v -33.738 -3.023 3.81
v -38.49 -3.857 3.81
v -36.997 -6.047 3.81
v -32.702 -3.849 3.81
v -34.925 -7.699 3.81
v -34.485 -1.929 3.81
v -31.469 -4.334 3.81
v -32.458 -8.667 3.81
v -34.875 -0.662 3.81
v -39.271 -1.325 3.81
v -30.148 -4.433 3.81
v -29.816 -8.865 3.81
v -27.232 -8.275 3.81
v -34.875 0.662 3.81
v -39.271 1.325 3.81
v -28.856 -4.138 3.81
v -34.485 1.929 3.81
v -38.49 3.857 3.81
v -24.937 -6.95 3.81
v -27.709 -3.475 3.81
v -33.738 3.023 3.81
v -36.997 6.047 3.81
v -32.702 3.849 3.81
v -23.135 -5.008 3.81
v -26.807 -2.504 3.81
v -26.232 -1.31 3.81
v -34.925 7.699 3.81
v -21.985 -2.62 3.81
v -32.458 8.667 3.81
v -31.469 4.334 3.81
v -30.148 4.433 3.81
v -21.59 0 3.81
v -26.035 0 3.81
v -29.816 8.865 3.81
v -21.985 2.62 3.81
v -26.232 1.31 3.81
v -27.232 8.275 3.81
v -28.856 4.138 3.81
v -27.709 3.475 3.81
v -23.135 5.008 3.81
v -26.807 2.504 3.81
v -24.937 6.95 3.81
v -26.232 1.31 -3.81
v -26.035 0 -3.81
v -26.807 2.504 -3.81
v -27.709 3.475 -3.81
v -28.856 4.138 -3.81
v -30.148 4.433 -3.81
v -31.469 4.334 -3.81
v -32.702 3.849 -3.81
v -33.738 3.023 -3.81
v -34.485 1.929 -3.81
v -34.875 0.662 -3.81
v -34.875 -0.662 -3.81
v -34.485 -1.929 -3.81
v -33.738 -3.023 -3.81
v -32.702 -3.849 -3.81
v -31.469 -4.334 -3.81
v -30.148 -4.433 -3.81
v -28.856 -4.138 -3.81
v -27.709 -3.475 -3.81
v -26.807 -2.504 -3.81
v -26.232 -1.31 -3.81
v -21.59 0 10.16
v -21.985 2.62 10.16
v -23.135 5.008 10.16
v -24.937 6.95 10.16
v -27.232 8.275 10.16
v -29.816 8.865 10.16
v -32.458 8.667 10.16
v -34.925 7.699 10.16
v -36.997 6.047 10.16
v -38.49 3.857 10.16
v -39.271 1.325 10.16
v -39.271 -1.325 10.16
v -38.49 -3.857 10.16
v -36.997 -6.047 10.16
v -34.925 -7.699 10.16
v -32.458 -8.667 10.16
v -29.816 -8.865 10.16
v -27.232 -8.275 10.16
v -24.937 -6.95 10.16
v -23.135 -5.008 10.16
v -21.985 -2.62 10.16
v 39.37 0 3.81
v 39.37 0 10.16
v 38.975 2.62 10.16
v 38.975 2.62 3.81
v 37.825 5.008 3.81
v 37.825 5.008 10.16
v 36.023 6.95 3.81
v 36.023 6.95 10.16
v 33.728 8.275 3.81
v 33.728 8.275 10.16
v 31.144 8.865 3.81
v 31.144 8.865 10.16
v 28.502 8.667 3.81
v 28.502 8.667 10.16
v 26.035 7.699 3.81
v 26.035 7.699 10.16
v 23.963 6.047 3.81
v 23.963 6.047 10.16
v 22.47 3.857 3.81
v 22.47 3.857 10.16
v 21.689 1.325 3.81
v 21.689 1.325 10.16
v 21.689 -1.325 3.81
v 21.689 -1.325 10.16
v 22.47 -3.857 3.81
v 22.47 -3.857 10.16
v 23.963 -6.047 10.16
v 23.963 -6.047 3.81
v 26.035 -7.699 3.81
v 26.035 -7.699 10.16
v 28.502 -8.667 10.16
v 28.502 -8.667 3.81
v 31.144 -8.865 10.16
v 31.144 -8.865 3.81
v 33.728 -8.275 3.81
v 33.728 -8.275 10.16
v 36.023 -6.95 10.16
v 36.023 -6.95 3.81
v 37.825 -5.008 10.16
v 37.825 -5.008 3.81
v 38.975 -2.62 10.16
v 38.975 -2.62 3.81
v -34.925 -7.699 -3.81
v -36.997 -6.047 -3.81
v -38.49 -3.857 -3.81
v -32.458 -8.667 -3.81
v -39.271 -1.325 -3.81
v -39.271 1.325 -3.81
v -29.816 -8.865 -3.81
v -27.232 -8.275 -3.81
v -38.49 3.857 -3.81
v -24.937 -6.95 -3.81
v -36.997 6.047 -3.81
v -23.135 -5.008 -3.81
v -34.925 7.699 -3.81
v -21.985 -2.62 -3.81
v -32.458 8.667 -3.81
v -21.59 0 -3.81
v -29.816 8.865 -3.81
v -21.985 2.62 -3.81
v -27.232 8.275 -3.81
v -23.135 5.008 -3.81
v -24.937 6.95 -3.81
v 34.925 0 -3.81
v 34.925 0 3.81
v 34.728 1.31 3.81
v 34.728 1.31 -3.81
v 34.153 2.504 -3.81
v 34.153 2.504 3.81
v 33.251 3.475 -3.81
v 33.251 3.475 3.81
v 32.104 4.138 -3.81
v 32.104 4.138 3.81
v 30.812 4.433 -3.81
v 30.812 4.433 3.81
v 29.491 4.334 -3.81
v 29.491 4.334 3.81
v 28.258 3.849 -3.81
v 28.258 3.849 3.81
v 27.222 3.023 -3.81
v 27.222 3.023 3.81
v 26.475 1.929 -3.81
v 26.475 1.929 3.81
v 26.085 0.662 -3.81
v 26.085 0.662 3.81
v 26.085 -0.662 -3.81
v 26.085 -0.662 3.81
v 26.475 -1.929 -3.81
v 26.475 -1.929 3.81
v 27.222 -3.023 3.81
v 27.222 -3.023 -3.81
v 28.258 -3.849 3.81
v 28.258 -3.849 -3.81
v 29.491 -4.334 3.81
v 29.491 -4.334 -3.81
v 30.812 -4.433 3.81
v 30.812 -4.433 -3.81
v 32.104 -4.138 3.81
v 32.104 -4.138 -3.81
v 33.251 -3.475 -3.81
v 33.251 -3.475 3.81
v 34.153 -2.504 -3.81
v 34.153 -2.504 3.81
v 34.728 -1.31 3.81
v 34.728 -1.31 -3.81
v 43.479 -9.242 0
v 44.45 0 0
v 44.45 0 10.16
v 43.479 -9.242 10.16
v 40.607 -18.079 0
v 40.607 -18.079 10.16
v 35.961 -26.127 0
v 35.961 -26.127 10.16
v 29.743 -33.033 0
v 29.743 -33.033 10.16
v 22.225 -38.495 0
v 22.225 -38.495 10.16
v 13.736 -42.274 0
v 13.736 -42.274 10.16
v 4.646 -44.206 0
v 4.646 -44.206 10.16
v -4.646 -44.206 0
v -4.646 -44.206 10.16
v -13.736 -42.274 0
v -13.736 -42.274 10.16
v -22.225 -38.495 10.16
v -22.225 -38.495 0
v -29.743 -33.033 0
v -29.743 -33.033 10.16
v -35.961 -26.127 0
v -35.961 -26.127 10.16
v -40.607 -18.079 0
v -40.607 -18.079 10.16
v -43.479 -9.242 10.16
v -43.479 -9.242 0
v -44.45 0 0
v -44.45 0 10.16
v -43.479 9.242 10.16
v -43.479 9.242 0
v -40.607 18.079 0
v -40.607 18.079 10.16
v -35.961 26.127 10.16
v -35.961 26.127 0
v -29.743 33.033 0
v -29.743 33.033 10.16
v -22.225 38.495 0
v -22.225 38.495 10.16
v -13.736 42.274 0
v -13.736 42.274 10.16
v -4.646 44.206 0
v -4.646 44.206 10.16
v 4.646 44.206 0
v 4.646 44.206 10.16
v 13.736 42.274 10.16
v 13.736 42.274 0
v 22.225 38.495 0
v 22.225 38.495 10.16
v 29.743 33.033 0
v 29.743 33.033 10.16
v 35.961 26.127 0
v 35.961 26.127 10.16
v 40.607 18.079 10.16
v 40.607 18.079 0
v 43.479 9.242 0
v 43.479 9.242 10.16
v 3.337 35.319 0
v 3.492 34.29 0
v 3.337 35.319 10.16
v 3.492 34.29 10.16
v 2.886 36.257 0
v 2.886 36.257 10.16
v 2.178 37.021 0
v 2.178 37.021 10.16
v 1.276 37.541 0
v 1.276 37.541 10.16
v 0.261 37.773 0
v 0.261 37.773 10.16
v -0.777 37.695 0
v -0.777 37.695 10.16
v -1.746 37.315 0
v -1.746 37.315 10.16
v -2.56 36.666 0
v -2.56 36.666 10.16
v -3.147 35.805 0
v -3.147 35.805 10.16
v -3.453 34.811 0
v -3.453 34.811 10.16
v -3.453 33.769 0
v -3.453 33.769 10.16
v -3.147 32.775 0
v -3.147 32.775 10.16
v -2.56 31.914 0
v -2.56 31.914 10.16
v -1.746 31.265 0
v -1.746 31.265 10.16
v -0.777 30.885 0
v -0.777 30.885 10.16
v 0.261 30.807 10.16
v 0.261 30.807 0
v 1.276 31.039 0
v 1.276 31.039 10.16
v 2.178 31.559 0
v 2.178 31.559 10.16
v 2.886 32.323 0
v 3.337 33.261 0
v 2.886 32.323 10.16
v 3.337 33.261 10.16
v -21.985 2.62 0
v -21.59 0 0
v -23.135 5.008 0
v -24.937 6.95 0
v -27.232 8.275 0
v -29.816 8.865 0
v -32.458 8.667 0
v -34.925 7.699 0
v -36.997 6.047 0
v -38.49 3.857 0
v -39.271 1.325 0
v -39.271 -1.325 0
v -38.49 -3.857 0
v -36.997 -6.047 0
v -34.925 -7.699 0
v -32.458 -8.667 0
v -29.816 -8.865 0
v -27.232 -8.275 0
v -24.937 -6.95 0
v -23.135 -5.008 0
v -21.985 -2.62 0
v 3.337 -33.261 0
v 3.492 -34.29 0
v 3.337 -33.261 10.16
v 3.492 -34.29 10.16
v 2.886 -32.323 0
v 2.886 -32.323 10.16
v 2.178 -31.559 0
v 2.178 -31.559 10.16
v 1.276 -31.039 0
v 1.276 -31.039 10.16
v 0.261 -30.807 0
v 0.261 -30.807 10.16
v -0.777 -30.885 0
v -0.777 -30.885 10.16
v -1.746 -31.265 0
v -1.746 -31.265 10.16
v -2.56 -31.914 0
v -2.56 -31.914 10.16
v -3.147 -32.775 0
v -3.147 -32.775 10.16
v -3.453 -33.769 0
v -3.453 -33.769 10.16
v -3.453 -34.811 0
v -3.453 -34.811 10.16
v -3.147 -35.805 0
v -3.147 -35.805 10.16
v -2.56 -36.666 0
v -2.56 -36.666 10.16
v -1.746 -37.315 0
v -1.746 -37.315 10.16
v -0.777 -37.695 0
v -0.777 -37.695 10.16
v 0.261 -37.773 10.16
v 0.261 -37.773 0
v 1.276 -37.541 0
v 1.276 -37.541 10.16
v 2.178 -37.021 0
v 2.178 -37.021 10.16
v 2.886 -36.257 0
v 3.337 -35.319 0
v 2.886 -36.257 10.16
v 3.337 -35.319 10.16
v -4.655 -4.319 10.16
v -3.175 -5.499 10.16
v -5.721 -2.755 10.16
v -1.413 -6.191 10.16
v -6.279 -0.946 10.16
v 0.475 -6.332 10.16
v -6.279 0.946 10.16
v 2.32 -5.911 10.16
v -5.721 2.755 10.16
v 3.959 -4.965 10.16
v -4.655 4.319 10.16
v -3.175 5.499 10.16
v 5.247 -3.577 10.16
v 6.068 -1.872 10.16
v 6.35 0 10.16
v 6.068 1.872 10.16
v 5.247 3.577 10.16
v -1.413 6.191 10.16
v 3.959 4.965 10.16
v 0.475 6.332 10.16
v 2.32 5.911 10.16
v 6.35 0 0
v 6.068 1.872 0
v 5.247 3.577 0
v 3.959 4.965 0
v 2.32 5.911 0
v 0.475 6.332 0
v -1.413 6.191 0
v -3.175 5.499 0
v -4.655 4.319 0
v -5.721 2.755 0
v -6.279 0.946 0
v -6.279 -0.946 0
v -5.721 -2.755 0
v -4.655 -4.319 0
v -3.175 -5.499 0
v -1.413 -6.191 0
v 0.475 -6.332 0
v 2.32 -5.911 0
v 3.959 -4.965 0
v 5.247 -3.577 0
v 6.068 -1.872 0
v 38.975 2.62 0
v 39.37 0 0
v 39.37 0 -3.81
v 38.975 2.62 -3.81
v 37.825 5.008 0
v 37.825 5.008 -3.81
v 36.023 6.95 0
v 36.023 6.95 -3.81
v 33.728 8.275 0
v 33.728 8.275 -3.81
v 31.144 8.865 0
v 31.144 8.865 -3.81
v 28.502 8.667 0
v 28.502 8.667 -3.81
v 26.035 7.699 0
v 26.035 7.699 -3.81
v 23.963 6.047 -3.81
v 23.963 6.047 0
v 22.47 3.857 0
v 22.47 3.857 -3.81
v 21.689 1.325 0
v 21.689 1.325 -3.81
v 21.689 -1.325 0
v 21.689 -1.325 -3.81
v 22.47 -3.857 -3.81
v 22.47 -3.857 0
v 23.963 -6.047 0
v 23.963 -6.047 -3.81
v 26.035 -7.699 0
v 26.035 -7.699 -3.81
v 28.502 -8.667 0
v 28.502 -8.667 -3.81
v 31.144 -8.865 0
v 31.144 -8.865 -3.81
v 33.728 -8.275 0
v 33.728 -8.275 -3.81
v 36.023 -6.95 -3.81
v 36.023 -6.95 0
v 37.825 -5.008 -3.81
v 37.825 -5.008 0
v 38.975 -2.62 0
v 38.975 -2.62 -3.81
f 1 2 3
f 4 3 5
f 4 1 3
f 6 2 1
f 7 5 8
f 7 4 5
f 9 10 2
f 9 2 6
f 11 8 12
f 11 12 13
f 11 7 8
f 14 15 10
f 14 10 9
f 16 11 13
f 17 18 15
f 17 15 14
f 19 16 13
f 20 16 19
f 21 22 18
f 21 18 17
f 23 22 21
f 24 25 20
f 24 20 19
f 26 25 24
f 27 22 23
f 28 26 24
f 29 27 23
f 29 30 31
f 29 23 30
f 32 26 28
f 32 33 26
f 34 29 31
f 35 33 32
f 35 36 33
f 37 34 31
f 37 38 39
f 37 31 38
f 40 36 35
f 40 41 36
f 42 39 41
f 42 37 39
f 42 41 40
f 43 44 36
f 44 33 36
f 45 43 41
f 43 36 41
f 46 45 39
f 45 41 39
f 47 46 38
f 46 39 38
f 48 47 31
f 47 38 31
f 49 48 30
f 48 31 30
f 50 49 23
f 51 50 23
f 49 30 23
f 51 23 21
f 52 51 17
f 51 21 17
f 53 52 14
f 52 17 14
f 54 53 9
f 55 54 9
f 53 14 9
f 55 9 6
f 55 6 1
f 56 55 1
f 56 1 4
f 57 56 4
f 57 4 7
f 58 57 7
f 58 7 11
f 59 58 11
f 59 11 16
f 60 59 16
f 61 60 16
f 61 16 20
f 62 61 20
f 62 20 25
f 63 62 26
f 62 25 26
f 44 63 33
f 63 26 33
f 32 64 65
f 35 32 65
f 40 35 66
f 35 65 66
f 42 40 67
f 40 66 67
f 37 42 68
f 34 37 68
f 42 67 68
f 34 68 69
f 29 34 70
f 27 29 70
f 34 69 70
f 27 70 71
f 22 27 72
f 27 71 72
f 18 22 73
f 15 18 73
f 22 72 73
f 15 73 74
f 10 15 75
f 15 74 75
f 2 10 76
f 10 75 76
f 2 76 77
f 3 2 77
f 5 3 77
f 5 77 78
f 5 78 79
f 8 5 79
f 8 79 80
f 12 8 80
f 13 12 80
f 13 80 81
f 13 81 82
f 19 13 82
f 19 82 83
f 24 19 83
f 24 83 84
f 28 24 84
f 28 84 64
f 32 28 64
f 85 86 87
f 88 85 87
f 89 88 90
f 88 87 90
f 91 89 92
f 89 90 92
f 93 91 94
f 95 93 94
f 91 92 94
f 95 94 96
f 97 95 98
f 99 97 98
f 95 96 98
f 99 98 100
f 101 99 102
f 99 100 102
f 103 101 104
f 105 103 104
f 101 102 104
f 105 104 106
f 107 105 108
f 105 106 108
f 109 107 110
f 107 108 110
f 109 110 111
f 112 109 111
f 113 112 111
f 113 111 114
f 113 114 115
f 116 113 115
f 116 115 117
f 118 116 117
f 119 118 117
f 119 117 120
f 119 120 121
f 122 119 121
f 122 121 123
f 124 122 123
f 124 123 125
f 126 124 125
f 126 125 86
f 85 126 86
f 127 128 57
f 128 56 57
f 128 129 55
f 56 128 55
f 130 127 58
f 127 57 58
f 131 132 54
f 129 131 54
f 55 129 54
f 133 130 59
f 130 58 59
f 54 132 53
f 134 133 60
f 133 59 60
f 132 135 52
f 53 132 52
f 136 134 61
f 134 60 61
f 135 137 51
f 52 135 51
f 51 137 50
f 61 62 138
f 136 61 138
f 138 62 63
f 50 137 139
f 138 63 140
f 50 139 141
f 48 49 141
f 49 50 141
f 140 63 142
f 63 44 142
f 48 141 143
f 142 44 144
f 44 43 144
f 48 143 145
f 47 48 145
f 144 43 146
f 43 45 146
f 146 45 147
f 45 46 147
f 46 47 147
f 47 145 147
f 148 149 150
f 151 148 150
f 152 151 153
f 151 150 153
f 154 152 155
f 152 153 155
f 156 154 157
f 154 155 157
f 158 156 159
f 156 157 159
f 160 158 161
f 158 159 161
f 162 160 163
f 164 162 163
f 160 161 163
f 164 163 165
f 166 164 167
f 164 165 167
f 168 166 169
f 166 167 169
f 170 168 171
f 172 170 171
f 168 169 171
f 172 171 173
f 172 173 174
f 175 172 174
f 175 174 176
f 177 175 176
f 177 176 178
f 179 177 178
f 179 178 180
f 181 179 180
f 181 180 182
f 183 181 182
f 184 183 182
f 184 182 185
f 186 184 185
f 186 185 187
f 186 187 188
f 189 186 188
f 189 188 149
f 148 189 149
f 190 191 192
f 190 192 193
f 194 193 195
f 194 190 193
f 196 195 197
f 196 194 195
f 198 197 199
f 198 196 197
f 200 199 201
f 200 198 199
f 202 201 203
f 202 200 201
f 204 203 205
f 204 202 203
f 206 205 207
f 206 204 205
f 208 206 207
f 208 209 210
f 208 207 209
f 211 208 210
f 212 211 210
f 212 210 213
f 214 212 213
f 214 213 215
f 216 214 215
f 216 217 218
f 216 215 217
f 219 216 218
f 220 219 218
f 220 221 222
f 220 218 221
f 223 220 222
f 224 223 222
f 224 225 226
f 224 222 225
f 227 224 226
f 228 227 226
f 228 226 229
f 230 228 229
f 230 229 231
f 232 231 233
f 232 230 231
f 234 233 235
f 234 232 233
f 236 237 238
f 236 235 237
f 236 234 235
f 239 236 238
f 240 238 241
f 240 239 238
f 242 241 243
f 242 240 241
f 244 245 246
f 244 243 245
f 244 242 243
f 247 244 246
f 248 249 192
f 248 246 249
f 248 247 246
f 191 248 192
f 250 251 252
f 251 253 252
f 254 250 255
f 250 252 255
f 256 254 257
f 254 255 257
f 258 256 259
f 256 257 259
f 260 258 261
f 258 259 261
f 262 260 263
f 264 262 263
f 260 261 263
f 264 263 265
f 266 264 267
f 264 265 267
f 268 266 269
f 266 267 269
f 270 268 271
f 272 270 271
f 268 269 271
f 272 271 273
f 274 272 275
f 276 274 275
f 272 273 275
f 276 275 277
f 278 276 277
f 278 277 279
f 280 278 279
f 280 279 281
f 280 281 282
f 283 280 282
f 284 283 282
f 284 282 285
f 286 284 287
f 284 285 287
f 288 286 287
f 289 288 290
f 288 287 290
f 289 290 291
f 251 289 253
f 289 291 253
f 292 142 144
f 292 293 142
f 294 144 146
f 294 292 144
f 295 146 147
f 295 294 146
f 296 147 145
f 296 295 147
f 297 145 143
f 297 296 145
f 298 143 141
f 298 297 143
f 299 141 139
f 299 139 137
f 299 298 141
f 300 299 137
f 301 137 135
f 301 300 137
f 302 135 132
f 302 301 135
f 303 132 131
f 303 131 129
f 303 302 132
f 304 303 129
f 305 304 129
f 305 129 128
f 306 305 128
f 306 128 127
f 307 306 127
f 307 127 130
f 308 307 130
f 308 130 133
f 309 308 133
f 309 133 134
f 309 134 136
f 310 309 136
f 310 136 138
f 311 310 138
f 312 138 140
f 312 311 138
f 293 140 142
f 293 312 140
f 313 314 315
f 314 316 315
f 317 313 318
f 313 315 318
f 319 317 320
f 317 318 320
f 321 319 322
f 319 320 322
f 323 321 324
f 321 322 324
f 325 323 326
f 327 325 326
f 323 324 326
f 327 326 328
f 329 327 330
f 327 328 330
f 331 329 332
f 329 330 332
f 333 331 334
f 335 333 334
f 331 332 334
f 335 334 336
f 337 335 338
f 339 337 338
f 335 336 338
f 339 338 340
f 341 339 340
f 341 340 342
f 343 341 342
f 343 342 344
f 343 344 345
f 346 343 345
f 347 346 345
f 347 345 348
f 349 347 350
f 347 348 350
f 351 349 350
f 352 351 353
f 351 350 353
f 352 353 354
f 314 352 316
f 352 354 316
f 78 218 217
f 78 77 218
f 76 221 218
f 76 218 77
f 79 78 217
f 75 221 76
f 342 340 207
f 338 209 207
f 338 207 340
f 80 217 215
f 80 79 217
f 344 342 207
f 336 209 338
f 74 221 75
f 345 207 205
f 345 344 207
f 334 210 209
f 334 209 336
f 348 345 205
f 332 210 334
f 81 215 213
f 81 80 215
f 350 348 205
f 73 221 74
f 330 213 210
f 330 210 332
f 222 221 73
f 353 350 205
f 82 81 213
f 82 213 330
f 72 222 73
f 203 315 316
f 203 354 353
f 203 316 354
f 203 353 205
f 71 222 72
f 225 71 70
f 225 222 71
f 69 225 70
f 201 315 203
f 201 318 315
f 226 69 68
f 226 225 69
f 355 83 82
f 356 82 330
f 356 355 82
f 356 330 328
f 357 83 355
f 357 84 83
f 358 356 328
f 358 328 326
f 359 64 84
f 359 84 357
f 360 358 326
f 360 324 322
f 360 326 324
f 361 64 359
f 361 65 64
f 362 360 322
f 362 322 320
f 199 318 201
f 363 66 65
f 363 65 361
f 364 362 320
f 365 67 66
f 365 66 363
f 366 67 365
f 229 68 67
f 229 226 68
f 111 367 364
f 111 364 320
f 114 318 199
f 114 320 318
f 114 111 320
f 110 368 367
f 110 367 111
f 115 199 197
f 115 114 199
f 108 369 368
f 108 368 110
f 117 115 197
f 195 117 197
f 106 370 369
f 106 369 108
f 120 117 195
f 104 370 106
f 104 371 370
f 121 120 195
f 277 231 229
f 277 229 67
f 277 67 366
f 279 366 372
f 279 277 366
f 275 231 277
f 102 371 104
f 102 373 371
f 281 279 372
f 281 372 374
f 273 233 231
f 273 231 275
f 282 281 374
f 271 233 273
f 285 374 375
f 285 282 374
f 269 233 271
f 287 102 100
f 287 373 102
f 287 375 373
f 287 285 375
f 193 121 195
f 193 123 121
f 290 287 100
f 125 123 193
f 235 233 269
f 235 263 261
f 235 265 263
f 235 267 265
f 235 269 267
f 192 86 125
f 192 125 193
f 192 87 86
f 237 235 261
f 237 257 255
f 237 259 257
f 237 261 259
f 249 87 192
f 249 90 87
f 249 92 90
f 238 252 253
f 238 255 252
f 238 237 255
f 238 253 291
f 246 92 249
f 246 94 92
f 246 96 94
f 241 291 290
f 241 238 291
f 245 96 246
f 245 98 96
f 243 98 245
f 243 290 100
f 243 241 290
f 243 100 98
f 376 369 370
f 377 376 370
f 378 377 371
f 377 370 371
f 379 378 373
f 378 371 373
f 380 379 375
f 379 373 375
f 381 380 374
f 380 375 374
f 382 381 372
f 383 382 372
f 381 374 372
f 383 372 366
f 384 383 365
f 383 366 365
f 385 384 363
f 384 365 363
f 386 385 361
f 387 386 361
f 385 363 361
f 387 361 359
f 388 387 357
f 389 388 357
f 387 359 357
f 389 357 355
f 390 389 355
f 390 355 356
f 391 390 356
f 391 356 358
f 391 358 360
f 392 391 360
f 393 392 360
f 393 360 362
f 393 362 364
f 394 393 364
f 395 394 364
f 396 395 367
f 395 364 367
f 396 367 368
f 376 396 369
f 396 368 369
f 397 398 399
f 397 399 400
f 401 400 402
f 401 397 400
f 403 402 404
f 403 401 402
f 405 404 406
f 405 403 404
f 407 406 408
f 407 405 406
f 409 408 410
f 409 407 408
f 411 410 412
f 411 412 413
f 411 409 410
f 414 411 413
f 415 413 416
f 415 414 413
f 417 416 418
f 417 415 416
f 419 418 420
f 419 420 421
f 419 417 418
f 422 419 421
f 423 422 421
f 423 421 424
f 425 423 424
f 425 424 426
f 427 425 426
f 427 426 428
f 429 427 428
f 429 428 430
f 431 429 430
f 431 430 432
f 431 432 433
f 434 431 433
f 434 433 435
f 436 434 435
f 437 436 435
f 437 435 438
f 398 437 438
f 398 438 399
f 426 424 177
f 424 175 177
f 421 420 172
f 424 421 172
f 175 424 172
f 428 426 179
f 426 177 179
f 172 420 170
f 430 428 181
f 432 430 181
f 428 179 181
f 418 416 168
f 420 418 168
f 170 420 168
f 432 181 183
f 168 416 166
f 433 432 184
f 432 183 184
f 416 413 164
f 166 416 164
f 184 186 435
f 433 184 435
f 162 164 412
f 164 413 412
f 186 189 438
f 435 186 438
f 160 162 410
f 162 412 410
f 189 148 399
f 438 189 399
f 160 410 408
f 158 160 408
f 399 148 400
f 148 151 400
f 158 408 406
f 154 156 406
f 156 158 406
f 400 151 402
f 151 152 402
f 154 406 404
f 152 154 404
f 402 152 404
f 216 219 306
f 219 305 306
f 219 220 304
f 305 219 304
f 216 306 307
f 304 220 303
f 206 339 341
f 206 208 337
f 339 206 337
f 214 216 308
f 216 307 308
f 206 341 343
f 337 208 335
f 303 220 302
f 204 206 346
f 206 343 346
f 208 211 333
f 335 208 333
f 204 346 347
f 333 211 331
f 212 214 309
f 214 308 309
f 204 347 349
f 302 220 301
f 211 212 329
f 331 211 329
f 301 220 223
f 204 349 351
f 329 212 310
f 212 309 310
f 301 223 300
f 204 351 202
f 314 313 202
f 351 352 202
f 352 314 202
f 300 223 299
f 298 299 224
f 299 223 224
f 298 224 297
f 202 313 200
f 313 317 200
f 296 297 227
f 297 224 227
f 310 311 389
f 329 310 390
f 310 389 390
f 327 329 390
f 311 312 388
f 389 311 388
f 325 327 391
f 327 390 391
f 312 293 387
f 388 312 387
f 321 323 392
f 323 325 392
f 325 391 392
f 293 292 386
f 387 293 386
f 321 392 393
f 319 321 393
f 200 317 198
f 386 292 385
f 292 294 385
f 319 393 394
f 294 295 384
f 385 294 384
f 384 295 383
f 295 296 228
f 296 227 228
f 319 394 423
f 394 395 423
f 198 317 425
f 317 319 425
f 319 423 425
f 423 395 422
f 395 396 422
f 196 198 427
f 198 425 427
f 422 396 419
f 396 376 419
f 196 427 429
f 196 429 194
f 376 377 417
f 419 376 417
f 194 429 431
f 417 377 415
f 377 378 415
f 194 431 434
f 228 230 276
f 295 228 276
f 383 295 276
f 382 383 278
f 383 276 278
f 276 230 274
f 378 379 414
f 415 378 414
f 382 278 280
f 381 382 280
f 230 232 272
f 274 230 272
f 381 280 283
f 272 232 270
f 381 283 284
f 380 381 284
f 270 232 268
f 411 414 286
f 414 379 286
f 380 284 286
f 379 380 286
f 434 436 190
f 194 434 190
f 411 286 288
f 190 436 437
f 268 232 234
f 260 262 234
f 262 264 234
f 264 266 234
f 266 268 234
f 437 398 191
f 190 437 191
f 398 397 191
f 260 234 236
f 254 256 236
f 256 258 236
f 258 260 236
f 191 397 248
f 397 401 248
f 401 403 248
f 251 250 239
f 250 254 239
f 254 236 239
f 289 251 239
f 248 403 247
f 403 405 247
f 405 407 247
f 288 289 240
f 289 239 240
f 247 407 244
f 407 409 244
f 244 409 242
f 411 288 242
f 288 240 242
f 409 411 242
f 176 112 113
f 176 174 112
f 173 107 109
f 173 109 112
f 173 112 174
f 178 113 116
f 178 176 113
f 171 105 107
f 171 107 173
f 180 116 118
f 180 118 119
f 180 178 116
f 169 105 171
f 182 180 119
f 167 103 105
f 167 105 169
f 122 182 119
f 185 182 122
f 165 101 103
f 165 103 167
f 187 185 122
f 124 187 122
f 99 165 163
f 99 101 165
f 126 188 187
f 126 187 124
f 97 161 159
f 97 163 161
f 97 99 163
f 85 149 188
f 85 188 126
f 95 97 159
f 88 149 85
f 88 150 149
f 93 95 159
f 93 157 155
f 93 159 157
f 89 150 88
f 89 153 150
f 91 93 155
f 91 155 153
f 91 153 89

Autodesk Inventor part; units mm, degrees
ref_plane "YZ Plane" through (0, 0, 0) normal (1, 0, 0) x (0, 1, 0)
ref_plane "XZ Plane" through (0, 0, 0) normal (0, 1, 0) x (-1, 0, 0)
ref_plane "XY Plane" through (0, 0, 0) normal (0, 0, 1) x (1, 0, 0)
sketch "Sketch1" plane through (0, 0, 0) normal (0, 0, 1) x (1, 0, 0)
  circle A0 centre (0, 0) radius 44.45
  dimension "d0" = 88.9
extrude "Extrusion1" add sketch "Sketch1" along normal blind 19.05
sketch "Sketch2" plane through (0, 0, 19.05) normal (0, 0, 1) x (1, 0, 0)
  circle A0 centre (0, 34.29) radius 3.4925
  circle A1 centre (0, -34.29) radius 3.4925
  point P0 (0, 0)
  dimension "d3" = 6.985
  dimension "d4" = 34.29
  dimension "d5" = 6.985
  dimension "d6" = 34.29
sketch "Sketch3" plane through (0, 0, 19.05) normal (0, 0, 1) x (1, 0, 0)
  circle A0 centre (0, 0) radius 44.45
  dimension "d9" = 88.9
extrude "Extrusion3" cut sketch "Sketch3" against normal blind 8.89
sketch "Sketch4" plane through (0, 0, 10.16) normal (0, 0, 1) x (1, 0, 0)
  circle A0 centre (0, 0) radius 6.35
  dimension "d12" = 12.7
extrude "Extrusion4" cut sketch "Sketch2" against normal blind 26.9875
extrude "Extrusion5" cut sketch "Sketch4" against normal blind 44.45
sketch "Sketch5" plane through (0, 0, 10.16) normal (0, 0, 1) x (1, 0, 0)
  circle A0 centre (-30.48, 0) radius 4.445
  circle A1 centre (0, 0) radius 6.35 projected
  circle A2 centre (0, 34.29) radius 3.4925 projected
  line L0 (0, 0) -> (0, 34.29)
  circle A3 centre (30.48, 0) radius 4.445
  dimension "d17" = 8.89
  dimension "d18" = 30.48
  dimension "d19" = 34.29
extrude "Extrusion6" cut sketch "Sketch5" against normal blind 80.9625 contours A0 | A3
sketch "Sketch6" plane through (0, 0, 10.16) normal (0, 0, 1) x (1, 0, 0)
  circle A0 centre (-30.48, 0) radius 8.89
  circle A1 centre (0, 34.29) radius 3.4925 projected
  line L0 (0, 0) -> (0, 34.29)
  circle A2 centre (30.48, 0) radius 8.89
  circle A3 centre (-30.48, 0) radius 4.445
  circle A4 centre (-30.48, 0) radius 4.445 projected
  circle A5 centre (30.48, 0) radius 4.445
  dimension "d22" = 17.78
  dimension "d23" = 30.48
  dimension "d24" = 34.29
  dimension "d25" = 0
extrude "Extrusion7" cut sketch "Sketch6" against normal blind 6.35 contours A0 | A2
sketch "Sketch8" plane through (-30.48, 0, 3.81) normal (0, 0, 1) x (1, 0, 0)
  circle A0 centre (0, 0) radius 4.445
  circle A1 centre (0, 0) radius 8.89
  circle A2 centre (0, 0) radius 4.445 projected
  circle A3 centre (0, 0) radius 8.89 projected
  circle A4 centre (30.48, 34.29) radius 3.4925 projected
  line L0 (30.48, 34.29) -> (30.48, 0)
  circle A5 centre (60.96, 0) radius 4.445
  circle A6 centre (60.96, 0) radius 8.89
  dimension "d28" = 0
  dimension "d29" = 0
  dimension "d30" = 30.48
  dimension "d31" = 34.29
extrude "Extrusion8" add sketch "Sketch8" against normal blind 7.62 contours A1 | A6
properties part number "Crank"
